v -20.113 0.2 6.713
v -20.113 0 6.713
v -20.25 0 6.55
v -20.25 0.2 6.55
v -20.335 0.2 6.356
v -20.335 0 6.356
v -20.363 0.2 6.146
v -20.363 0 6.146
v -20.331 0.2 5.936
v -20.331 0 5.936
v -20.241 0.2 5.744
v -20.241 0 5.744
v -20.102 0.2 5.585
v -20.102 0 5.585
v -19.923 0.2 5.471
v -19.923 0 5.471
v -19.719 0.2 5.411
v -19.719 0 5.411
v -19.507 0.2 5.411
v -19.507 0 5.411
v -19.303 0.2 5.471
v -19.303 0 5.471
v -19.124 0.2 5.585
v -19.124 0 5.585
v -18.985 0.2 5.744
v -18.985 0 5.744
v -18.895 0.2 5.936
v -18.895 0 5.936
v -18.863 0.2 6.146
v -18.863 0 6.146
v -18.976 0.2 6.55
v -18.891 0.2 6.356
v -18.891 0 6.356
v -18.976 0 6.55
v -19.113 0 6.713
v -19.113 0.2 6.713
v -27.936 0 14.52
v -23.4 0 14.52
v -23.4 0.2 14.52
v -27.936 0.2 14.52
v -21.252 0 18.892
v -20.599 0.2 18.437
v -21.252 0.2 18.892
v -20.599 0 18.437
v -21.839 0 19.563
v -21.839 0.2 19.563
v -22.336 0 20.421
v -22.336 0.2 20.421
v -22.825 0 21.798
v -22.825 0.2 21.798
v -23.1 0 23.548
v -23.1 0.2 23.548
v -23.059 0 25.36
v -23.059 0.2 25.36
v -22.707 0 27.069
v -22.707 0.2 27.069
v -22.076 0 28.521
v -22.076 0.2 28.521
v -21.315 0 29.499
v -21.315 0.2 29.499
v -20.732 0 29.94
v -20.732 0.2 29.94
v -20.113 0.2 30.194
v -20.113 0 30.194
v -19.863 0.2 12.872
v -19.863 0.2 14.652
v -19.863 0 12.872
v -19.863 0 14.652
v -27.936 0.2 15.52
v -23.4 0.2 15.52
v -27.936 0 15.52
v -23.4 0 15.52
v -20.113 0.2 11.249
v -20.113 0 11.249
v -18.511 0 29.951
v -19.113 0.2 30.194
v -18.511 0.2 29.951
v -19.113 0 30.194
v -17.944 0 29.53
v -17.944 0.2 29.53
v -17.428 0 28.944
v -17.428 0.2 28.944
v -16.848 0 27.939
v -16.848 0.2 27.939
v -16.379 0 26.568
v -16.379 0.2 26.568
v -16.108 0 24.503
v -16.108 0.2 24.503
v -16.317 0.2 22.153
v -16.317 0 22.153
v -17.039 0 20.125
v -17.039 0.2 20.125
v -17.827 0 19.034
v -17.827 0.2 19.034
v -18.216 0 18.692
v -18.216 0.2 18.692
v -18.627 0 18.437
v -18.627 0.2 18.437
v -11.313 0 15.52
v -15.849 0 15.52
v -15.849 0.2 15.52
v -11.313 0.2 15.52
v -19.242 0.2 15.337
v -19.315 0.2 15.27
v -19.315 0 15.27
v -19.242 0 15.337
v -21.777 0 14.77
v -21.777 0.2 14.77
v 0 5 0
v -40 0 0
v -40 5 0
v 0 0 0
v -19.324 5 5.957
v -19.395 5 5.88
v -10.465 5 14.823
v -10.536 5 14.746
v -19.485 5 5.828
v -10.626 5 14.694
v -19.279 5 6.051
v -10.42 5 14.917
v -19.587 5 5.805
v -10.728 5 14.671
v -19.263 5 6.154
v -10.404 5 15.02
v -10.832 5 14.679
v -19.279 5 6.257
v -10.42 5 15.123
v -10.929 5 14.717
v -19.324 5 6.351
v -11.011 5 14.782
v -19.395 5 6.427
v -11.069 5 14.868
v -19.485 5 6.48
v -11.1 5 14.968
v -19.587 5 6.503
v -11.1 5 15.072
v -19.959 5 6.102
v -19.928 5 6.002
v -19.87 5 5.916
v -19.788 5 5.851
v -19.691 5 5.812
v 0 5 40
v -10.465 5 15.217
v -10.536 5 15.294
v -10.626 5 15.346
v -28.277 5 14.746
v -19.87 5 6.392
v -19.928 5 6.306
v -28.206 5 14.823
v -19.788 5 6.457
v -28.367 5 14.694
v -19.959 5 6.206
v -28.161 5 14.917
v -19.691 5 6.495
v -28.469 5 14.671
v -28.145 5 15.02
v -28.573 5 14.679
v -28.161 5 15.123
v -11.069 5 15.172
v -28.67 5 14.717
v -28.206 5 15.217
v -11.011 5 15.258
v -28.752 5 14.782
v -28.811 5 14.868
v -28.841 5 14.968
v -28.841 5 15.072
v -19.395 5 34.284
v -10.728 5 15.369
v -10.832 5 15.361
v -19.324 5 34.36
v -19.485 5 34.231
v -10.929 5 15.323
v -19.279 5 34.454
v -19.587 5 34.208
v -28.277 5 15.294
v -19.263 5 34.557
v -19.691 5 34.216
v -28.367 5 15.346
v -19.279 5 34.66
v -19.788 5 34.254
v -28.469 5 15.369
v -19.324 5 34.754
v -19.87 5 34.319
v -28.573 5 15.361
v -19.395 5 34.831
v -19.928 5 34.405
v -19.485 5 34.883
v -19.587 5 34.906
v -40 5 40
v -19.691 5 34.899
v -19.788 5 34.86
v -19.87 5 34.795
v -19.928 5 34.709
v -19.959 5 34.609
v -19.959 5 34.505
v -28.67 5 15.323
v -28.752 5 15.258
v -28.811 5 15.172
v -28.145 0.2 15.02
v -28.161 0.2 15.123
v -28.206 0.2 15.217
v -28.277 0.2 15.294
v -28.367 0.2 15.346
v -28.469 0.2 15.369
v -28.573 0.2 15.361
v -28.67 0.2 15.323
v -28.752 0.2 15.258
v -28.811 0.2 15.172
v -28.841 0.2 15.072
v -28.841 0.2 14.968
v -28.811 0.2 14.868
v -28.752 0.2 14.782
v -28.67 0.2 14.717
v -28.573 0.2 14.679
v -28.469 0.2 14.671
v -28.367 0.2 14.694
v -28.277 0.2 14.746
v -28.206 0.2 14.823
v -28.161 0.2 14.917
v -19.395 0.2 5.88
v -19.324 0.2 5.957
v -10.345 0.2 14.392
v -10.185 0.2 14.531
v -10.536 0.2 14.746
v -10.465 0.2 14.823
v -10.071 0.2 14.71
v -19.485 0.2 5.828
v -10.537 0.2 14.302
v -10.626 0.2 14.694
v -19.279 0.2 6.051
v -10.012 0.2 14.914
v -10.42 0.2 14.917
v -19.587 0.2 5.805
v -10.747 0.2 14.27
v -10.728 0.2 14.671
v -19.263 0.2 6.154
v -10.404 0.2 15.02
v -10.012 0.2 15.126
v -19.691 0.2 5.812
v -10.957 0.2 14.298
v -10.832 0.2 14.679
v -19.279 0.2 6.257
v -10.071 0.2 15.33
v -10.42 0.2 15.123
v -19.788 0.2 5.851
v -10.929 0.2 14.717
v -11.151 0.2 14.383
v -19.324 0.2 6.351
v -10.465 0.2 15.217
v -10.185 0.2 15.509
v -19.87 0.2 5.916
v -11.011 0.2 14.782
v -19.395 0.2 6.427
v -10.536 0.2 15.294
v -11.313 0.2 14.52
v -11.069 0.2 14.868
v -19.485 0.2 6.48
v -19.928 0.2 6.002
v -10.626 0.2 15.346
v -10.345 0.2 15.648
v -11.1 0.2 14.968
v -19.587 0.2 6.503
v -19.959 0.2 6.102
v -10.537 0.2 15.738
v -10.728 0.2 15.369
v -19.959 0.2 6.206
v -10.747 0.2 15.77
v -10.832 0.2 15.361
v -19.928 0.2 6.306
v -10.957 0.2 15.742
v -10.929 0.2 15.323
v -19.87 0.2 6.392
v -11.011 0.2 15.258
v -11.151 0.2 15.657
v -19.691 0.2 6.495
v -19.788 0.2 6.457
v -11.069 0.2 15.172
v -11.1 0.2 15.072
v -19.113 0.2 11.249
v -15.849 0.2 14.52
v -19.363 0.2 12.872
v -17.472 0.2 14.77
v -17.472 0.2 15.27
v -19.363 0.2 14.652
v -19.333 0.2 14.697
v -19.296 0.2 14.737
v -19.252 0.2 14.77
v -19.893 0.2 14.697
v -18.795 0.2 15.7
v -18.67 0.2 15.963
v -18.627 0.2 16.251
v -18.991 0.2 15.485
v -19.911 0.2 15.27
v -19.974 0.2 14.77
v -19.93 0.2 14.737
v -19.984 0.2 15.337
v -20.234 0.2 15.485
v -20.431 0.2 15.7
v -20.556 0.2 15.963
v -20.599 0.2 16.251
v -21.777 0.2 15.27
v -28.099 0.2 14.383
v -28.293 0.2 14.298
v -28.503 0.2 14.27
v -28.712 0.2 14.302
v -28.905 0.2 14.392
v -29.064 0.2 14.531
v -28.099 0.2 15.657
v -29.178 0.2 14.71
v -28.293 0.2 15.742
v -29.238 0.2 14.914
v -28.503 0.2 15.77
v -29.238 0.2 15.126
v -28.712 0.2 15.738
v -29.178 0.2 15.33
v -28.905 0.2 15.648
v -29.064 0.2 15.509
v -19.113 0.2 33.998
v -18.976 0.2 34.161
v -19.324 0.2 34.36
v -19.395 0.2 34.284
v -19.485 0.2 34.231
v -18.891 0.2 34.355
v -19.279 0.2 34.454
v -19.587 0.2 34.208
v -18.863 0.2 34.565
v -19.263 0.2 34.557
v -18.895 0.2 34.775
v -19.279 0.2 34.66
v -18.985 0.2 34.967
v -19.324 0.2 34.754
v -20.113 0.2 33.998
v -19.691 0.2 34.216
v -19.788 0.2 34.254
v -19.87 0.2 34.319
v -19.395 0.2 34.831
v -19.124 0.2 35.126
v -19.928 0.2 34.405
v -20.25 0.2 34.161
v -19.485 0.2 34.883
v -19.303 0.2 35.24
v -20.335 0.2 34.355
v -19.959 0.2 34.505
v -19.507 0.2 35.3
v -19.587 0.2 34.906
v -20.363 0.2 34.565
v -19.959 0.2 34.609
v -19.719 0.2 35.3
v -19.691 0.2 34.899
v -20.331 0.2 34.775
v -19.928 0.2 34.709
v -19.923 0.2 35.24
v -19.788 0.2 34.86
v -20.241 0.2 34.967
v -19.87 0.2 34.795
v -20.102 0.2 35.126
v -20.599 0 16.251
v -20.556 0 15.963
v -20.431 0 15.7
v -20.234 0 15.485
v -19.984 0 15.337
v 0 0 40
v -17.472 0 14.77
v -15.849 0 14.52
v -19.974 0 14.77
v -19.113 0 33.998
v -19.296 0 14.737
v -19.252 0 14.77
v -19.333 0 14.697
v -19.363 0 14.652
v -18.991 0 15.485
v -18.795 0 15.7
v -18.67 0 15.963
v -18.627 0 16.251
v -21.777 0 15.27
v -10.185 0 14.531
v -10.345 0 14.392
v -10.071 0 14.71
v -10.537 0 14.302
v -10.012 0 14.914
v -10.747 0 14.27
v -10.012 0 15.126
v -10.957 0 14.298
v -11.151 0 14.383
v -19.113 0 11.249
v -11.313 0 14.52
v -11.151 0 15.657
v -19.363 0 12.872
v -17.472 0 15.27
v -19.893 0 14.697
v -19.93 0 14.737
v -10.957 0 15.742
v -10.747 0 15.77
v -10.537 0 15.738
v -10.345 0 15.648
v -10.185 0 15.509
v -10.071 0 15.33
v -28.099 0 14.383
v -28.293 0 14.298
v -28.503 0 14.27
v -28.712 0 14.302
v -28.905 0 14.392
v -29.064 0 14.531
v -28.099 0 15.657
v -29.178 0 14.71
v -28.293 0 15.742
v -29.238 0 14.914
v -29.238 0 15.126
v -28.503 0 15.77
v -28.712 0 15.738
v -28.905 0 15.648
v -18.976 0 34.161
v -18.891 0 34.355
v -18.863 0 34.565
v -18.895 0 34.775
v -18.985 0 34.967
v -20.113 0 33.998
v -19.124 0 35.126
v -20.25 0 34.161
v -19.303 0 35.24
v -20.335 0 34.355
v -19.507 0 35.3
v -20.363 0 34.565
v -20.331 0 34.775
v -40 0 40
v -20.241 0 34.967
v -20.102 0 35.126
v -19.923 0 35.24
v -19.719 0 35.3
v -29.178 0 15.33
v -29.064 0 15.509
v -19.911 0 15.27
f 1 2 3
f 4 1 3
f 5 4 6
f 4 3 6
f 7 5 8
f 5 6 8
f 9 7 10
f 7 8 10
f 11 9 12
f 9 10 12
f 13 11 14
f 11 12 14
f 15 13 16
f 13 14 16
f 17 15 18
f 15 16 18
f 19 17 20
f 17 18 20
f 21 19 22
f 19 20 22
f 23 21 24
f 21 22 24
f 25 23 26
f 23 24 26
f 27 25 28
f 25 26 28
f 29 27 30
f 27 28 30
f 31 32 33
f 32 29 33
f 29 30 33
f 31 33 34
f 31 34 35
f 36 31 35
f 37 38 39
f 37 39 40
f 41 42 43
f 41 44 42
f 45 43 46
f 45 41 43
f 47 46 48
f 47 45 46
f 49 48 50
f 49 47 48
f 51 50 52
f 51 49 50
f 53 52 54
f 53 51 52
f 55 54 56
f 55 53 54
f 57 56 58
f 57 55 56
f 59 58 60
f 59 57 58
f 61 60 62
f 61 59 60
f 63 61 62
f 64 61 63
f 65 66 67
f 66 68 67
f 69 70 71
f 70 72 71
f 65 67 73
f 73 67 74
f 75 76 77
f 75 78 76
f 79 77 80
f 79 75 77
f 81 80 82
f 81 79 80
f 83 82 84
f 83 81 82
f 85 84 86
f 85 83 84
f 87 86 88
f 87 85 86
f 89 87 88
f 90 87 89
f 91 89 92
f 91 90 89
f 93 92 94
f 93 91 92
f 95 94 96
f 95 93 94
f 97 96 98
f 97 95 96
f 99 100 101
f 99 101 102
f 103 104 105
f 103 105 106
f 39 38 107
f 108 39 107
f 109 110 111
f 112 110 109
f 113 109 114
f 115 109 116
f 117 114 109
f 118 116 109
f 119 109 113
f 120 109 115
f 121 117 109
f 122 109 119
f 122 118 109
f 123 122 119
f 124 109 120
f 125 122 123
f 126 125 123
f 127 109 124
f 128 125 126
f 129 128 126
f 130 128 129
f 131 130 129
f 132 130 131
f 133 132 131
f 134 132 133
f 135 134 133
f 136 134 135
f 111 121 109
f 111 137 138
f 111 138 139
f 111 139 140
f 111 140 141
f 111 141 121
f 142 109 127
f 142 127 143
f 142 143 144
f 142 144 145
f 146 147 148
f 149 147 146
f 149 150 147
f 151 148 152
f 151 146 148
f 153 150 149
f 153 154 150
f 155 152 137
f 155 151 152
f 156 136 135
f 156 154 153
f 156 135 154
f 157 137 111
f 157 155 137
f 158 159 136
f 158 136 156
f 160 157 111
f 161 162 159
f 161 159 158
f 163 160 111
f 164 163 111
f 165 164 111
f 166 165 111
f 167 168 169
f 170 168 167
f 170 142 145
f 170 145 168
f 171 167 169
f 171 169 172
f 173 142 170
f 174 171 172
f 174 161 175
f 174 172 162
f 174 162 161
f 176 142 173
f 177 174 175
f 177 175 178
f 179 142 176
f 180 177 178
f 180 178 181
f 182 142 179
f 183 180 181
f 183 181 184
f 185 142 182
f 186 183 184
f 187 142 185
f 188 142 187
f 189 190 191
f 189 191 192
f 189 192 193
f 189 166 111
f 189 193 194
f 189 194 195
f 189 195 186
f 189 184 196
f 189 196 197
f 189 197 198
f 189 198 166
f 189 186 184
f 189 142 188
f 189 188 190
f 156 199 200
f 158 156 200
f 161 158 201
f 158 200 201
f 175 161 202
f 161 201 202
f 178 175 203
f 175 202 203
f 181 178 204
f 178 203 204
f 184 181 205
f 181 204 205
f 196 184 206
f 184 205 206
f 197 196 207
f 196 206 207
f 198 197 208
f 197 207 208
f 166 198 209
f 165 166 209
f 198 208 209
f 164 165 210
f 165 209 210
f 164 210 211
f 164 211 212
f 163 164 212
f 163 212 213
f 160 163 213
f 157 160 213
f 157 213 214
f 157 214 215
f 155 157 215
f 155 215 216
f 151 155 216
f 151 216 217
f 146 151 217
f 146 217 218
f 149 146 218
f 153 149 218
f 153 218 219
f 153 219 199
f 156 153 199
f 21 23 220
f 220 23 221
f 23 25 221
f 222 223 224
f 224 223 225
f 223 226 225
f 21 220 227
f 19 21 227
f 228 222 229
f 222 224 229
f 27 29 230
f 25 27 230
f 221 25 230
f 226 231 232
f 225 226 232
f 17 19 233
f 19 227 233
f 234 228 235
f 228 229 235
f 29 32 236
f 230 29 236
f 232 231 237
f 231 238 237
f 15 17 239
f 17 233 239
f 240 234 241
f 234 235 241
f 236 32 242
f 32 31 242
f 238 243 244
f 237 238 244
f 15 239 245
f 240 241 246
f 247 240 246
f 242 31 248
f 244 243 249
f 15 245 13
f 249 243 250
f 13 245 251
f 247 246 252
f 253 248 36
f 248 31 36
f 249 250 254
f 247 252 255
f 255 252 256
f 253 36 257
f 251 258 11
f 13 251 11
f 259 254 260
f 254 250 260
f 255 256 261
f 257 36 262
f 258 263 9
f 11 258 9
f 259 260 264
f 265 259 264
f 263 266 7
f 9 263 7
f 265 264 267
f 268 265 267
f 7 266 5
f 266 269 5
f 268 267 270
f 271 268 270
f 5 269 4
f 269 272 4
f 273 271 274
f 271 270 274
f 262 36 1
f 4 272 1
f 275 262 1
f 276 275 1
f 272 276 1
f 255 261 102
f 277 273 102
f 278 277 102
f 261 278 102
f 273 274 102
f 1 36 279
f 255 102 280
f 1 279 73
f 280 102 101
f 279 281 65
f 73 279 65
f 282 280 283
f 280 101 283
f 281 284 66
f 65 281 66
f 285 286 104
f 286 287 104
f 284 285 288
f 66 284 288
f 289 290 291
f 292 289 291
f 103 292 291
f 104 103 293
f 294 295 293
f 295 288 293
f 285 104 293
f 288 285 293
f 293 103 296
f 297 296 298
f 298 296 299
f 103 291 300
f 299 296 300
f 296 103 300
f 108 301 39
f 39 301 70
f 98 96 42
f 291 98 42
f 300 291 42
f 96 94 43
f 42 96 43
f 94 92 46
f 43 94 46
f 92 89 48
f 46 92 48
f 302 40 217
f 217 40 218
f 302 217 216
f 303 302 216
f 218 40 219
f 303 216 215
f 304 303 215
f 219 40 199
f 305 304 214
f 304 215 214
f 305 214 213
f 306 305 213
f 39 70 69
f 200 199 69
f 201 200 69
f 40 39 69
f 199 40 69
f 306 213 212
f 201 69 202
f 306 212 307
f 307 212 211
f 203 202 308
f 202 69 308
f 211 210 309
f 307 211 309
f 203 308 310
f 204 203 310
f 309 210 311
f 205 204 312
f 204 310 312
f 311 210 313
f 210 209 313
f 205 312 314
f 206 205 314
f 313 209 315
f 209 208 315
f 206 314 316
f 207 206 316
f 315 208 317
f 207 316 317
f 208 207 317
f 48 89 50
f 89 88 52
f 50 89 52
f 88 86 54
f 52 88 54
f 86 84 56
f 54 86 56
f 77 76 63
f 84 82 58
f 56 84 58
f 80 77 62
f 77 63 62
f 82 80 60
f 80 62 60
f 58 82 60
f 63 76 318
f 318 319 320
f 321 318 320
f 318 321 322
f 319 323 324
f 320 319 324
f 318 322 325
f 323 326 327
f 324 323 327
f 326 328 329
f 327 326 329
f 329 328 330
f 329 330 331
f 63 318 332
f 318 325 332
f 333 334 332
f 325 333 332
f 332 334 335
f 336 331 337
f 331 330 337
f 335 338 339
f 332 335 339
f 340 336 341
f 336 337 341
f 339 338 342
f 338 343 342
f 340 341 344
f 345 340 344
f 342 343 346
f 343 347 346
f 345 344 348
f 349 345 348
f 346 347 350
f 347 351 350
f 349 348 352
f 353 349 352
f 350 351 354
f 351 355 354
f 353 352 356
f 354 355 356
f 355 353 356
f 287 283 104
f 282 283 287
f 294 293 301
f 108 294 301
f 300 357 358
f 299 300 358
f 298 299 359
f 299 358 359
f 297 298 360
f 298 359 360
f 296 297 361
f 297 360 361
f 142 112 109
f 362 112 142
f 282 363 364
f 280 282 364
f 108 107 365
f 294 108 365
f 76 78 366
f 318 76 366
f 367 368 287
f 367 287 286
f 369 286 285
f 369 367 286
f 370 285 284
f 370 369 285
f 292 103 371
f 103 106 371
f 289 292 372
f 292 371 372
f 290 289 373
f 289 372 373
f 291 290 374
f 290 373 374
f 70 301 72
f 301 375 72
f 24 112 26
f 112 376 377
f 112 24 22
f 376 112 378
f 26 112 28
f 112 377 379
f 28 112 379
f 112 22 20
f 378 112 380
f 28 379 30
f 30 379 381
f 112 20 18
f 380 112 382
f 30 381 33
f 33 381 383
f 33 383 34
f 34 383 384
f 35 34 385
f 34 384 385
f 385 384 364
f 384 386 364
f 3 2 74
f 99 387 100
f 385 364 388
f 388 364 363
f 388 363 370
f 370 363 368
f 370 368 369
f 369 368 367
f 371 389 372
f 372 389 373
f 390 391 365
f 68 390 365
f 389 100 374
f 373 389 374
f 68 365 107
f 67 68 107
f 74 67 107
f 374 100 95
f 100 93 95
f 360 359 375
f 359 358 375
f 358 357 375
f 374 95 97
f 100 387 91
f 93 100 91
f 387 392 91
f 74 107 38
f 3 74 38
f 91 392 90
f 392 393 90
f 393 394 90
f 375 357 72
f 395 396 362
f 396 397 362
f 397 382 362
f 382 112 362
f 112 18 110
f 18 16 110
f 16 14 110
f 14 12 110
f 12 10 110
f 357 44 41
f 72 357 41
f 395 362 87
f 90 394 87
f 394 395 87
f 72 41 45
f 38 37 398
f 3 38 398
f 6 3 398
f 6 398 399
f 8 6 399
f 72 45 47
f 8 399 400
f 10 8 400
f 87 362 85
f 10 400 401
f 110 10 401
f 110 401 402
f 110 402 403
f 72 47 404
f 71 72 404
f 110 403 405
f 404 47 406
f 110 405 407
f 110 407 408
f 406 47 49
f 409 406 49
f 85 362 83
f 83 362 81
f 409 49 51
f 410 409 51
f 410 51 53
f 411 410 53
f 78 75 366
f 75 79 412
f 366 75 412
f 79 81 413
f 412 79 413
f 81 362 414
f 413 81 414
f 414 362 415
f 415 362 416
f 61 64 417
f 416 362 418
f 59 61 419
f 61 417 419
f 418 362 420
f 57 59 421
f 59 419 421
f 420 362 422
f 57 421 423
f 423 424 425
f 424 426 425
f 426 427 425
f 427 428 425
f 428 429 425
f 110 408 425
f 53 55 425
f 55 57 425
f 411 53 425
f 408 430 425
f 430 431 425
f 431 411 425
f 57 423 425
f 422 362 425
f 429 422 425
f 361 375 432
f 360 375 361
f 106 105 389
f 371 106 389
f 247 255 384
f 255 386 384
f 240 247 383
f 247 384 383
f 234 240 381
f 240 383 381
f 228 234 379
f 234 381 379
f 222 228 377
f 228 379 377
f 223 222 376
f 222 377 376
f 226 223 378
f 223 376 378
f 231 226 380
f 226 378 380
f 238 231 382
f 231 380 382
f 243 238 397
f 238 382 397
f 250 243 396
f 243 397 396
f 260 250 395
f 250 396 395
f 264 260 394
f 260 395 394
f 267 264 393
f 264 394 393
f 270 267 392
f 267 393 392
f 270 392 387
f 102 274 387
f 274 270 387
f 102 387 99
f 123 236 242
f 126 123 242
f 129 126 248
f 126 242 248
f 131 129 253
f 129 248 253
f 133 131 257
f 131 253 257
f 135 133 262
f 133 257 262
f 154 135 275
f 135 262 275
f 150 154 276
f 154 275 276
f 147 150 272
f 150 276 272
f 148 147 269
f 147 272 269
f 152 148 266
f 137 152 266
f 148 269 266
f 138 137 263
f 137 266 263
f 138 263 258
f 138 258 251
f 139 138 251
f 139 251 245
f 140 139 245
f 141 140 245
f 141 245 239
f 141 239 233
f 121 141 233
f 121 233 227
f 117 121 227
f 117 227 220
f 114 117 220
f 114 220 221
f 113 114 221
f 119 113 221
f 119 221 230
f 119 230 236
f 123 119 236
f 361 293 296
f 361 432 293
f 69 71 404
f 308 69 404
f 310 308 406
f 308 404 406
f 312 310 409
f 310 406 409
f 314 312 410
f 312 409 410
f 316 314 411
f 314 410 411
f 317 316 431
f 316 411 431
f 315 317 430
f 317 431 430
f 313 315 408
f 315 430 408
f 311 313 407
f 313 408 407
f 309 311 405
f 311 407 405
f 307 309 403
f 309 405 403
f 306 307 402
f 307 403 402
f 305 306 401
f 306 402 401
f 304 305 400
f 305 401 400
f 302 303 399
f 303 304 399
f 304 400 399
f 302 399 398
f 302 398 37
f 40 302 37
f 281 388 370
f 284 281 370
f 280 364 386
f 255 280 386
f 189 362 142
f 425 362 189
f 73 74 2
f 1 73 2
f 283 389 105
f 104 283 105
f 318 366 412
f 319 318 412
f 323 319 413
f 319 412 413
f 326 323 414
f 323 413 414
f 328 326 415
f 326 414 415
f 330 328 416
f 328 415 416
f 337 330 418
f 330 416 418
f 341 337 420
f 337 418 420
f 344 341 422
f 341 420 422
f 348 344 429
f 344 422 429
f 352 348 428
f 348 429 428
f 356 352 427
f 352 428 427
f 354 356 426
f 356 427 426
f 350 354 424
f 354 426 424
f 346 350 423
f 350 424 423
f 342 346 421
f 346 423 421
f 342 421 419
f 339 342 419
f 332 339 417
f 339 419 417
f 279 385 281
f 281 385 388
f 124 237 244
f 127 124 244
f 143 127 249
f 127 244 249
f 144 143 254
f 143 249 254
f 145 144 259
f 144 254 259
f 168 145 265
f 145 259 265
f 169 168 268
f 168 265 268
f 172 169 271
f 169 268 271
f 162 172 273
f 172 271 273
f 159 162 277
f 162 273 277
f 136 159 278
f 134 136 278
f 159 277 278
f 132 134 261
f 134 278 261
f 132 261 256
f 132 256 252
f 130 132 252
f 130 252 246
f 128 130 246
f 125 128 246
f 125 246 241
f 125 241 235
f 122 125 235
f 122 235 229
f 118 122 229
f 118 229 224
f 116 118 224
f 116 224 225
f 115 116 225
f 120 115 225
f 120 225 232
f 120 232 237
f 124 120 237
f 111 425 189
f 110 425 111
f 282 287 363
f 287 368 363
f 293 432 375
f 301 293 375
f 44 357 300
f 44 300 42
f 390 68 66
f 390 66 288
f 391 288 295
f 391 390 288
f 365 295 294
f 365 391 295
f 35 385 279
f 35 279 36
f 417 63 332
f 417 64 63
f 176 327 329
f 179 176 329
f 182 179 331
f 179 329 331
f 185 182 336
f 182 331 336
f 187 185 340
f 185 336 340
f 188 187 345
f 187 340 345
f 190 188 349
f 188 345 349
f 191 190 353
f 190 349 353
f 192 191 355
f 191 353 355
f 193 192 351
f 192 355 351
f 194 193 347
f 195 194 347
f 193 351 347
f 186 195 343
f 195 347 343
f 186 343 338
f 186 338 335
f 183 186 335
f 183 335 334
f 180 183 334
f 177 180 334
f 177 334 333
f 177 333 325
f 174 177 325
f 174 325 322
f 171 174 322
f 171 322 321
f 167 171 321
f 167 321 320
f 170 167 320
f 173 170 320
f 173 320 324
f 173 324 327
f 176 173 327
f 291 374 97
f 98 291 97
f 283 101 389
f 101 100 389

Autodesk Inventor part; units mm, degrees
ref_plane "YZ Plane" through (0, 0, 0) normal (1, 0, 0) x (0, 1, 0)
ref_plane "XZ Plane" through (0, 0, 0) normal (0, 1, 0) x (-1, 0, 0)
ref_plane "XY Plane" through (0, 0, 0) normal (0, 0, 1) x (1, 0, 0)
sketch "Boceto1" plane through (0, 0, 0) normal (0, 1, 0) x (-1, 0, 0)
  arc A0 (19.363, 14.6519) -> (19.2523, 14.77) centre (19.0755, 14.4935) ccw
  arc A1 (19.9736, 14.77) -> (19.863, 14.6519) centre (20.1504, 14.4935) ccw
  ellipse E0 centre (19.613, 24.2247) end of major axis (19.613, 30.2556) minor radius 3.5091 (19.113, 30.1941) -> (18.6267, 18.4369) ccw
  arc A2 (18.6267, 16.2507) -> (19.2422, 15.3368) centre (19.613, 16.2507) ccw
  arc A3 (19.9837, 15.3368) -> (20.5992, 16.2507) centre (19.613, 16.2507) ccw
  line L0 (20.5992, 16.2507) -> (20.5992, 18.4369)
  line L1 (23.3999, 14.52) -> (21.7772, 14.77)
  line L2 (21.7772, 15.27) -> (23.3999, 15.52)
  line L3 (40, 0) -> (0, 0)
  line L4 (18.6267, 16.2507) -> (18.6267, 18.4369)
  ellipse E1 centre (19.613, 24.2247) end of major axis (19.613, 30.2556) minor radius 3.5091 (20.5992, 18.4369) -> (20.113, 30.1941) ccw
  line L5 (21.7772, 14.77) -> (19.9736, 14.77)
  line L6 (19.997, 15.27) -> (21.7772, 15.27)
  line L7 (19.997, 15.27) -> (19.9109, 15.27)
  line L8 (19.9109, 15.27) -> (19.9837, 15.3368)
  line L9 (19.2289, 15.27) -> (19.315, 15.27)
  line L10 (19.315, 15.27) -> (19.2422, 15.3368)
  arc A4 (27.9362, 14.52) -> (27.9362, 15.52) centre (28.4952, 15.02) ccw
  line L11 (23.3999, 15.52) -> (27.9362, 15.52)
  line L12 (23.3999, 14.52) -> (27.9362, 14.52)
  line L13 (15.8494, 15.52) -> (17.4722, 15.27)
  line L14 (17.4722, 14.77) -> (15.8494, 14.52)
  line L15 (17.4722, 15.27) -> (19.2757, 15.27)
  line L16 (19.2523, 14.77) -> (17.4722, 14.77)
  arc A5 (11.3132, 15.52) -> (11.3132, 14.52) centre (10.7541, 15.02) ccw
  line L17 (15.8494, 14.52) -> (11.3132, 14.52)
  line L18 (15.8494, 15.52) -> (11.3132, 15.52)
  line L19 (19.863, 12.8717) -> (20.113, 11.249)
  line L20 (19.113, 11.249) -> (19.363, 12.8717)
  line L21 (20.113, 11.249) -> (20.113, 6.7127)
  arc A6 (19.113, 6.7127) -> (20.113, 6.7127) centre (19.613, 6.1537) ccw
  line L22 (19.113, 11.249) -> (19.113, 6.7127)
  line L23 (19.363, 12.8717) -> (19.363, 14.6519)
  line L24 (19.863, 14.6519) -> (19.863, 12.8717)
  arc A7 (20.113, 33.9983) -> (19.113, 33.9983) centre (19.613, 34.5573) ccw
  line L25 (19.113, 30.1941) -> (19.113, 33.9983)
  line L26 (20.113, 30.1941) -> (20.113, 33.9983)
  line L27 (0, 0) -> (0, 40)
  line L28 (0, 40) -> (40, 40)
  line L29 (40, 40) -> (40, 0)
extrude "Extrusión1" add sketch "Boceto1" along normal blind 5 contours A0 L16 L14 L17 A5 L18 L13 L15 L9 L10 A2 L4 E0 L25 A7 L26 E1 L0 A3 L8 L7 L6 L2 L11 A4 L12 L1 L5 A1 L24 L19 L21 A6 L22 L20 L23 | L3 L27 L28 L29
extrude "Extrusión2" cut sketch "Boceto1" along normal blind 0.2 contours A0 L16 L14 L17 A5 L18 L13 L15 L9 L10 A2 L4 E0 L25 A7 L26 E1 L0 A3 L8 L7 L6 L2 L11 A4 L12 L1 L5 A1 L24 L19 L21 A6 L22 L20 L23
sketch "Boceto2" plane through (0, 0.2, 0) normal (0, -1, 0) x (1, 0, 0)
  arc A0 (-19.113, 33.9983) -> (-20.113, 33.9983) centre (-19.613, 34.5573) ccw projected
  arc A1 (-11.3132, 14.52) -> (-11.3132, 15.52) centre (-10.7541, 15.02) ccw projected
  arc A2 (-20.113, 6.7127) -> (-19.113, 6.7127) centre (-19.613, 6.1537) ccw projected
  arc A3 (-27.9362, 15.52) -> (-27.9362, 14.52) centre (-28.4952, 15.02) ccw projected
  circle A4 centre (-28.4952, 15.02) radius 0.35
  circle A5 centre (-19.613, 6.1537) radius 0.35
  circle A6 centre (-10.7541, 15.02) radius 0.35
  circle A7 centre (-19.613, 34.5573) radius 0.35
  point P0 (0, 0)
  dimension "d11" = 0.7
  dimension "d12" = 0.7
  dimension "d13" = 0.7
  dimension "d14" = 0.7
extrude "Extrusión3" cut sketch "Boceto2" against normal through all
properties part number "droplet-generator"
